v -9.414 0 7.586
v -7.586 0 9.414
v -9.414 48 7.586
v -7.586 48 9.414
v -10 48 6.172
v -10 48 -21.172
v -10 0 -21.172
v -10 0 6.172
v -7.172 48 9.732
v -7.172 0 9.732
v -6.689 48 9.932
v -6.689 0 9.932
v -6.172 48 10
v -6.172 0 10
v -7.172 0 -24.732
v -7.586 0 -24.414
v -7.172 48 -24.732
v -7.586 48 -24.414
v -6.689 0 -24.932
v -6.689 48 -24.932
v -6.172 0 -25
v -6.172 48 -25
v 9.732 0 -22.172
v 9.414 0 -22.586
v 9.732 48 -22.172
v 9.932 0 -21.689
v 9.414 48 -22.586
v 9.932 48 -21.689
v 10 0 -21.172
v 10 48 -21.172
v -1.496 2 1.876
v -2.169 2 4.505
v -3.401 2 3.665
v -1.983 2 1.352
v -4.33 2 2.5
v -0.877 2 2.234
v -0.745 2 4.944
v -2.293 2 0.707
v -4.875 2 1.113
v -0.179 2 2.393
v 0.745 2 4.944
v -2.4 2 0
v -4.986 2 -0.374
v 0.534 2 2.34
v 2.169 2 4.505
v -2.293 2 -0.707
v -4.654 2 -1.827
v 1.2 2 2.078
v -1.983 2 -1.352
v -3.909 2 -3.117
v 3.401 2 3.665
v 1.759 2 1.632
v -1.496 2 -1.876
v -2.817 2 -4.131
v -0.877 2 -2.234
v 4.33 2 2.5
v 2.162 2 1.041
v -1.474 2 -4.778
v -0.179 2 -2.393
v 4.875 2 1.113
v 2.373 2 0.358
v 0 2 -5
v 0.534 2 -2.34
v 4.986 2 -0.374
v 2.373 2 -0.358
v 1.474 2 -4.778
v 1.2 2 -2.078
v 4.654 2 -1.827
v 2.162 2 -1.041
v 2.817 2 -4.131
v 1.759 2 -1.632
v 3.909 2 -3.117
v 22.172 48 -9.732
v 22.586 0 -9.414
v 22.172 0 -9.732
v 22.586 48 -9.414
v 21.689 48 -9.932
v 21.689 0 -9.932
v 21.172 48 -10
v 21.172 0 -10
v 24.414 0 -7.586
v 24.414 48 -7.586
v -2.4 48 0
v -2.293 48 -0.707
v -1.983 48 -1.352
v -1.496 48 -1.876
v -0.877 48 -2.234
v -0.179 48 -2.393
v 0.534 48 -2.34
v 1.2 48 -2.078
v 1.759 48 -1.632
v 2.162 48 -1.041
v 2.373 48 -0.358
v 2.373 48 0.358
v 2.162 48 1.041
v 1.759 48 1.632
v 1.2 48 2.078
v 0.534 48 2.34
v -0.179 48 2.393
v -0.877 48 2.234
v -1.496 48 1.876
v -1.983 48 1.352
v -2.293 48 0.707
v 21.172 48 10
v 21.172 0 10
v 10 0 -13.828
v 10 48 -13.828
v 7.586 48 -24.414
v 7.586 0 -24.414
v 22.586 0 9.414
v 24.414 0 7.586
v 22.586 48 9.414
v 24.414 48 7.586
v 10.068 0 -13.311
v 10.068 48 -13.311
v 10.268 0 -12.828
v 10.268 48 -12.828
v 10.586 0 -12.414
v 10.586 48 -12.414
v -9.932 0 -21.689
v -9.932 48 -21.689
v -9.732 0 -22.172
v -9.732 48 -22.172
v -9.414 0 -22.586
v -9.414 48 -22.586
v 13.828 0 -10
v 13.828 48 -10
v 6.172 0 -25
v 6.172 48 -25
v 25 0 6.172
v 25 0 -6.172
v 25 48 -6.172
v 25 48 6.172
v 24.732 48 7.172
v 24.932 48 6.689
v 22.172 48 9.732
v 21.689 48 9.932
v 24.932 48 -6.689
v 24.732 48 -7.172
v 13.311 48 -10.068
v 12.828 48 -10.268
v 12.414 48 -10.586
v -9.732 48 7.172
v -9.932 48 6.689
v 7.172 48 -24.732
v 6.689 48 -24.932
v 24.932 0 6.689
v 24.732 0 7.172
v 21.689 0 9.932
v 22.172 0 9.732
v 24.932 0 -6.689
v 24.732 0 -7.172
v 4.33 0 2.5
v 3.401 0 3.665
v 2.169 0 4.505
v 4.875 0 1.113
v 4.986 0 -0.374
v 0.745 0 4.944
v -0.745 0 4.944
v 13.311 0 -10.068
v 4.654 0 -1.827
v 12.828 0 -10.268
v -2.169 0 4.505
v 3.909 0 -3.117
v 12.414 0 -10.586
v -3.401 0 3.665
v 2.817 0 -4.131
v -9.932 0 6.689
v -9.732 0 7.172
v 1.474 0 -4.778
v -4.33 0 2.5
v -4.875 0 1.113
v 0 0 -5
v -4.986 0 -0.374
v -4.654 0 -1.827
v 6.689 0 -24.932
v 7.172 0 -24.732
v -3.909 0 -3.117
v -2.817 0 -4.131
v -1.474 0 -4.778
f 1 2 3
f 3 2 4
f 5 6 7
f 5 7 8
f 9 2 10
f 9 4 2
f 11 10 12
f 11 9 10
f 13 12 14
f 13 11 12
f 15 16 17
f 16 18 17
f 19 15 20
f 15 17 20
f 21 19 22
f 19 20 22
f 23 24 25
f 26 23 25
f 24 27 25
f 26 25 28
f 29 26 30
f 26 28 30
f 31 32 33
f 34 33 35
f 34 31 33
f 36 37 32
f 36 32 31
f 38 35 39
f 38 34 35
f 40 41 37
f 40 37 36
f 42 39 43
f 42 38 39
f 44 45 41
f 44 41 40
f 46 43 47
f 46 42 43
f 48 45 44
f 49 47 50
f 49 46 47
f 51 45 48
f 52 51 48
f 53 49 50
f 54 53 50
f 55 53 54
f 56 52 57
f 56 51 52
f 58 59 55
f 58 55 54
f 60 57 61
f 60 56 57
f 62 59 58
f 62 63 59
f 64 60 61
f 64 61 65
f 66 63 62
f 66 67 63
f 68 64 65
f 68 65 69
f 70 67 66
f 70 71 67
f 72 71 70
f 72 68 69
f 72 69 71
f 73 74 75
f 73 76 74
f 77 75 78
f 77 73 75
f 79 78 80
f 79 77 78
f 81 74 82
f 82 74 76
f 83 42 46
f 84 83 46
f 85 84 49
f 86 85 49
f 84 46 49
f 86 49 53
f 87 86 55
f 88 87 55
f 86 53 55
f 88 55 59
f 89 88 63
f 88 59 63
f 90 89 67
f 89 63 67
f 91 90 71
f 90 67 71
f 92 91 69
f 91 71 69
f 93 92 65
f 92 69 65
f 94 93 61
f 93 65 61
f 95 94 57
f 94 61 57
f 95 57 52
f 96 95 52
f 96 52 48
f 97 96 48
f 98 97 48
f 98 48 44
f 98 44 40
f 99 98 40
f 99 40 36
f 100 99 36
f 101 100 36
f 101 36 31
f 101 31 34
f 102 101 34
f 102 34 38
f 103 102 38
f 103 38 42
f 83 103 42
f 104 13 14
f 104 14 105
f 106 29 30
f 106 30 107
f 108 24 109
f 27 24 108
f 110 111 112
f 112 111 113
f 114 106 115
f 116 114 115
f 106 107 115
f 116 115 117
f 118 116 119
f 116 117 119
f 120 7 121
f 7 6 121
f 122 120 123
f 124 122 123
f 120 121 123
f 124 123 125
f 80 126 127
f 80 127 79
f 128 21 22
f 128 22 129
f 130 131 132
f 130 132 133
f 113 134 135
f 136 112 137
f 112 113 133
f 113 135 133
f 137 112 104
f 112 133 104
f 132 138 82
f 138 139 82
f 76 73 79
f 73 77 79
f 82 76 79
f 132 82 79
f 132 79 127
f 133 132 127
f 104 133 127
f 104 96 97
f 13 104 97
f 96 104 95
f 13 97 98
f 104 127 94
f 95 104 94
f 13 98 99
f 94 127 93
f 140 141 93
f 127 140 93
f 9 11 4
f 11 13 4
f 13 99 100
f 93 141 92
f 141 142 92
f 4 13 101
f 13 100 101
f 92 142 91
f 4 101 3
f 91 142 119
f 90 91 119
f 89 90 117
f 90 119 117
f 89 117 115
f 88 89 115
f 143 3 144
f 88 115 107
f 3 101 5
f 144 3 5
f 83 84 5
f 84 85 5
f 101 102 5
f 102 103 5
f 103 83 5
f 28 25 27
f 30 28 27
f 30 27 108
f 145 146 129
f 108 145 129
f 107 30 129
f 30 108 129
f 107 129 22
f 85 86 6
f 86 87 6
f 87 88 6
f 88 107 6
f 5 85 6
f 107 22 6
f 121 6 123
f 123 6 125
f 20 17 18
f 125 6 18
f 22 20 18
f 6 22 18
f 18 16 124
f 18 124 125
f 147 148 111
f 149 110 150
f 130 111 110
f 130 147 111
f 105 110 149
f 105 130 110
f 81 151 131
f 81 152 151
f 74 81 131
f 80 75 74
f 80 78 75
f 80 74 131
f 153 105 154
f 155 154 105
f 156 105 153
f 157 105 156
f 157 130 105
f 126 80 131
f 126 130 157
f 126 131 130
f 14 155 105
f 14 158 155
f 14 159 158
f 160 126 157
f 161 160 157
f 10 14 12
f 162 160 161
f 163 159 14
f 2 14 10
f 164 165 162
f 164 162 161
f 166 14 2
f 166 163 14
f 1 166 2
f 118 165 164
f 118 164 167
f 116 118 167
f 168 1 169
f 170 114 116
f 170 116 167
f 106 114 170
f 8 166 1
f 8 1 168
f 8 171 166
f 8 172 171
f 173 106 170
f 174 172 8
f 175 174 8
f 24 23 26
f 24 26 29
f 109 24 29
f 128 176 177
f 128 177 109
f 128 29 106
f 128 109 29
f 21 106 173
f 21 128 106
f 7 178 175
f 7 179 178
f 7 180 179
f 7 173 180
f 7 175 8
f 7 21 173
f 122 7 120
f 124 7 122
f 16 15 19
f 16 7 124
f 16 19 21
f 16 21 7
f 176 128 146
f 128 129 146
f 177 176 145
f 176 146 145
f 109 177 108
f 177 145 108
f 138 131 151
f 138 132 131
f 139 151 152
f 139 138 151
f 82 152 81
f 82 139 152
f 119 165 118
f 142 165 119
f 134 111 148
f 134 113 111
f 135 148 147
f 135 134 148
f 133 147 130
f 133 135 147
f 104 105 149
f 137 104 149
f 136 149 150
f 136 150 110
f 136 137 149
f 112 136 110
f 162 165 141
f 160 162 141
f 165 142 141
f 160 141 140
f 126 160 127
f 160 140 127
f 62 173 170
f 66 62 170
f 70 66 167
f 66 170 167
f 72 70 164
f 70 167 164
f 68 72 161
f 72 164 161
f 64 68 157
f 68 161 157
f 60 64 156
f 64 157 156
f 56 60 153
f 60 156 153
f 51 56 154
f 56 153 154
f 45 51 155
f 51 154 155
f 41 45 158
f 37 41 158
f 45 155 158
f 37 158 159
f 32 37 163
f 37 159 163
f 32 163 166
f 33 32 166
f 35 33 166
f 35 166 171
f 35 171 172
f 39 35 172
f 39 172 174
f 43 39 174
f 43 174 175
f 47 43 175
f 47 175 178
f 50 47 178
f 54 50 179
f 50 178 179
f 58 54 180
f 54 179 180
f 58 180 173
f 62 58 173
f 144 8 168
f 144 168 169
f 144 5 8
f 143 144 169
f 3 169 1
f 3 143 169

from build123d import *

# Parameters (mm, degrees)
BOSS_EXTRUDE1_DEPTH  = 48
M4_CLEARANCE_HOLE1_D = 4.8
SKETCH4_R            = 5
CUT_EXTRUDE1_DEPTH   = 2
CHAMFER1_SIZE        = 3
FILLET1_R            = 2


with BuildPart() as part:
    # Sketch1 → Boss-Extrude1 (new body)
    with BuildSketch(Plane(origin=(0, 0, 0), x_dir=(1, 0, 0), z_dir=(0, 1, 0))):
        Polygon((-10, 10), (-10, 25), (10, 25), (10, 10), (25, 10), (25, -10), (10, -10), (-10, -10), align=None)
    extrude(amount=BOSS_EXTRUDE1_DEPTH)

    # M4 Clearance Hole1 (through all)
    with Locations(Plane(origin=(0, 48, 0), x_dir=(1, 0, 0), z_dir=(0, 1, 0))):
        with Locations((0, 0)):
            Hole(M4_CLEARANCE_HOLE1_D / 2)

    # Sketch4 → Cut-Extrude1 (cut)
    with BuildSketch(Plane.XZ):
        with Locations(Location((0, 0, 0), (0, 0, 270))):
            Circle(SKETCH4_R)
    extrude(amount=-CUT_EXTRUDE1_DEPTH, mode=Mode.SUBTRACT)

    # Chamfer1
    chamfer1_edges = [part.edges().sort_by_distance(p)[0] for p in [
        (-10, 24, -25),
        (10, 24, -25),
        (10, 24, -10),
        (25, 24, -10),
        (25, 24, 10),
        (-10, 24, 10),
    ]]
    chamfer(chamfer1_edges, length=CHAMFER1_SIZE)

    # Fillet1
    fillet1_edges = [part.edges().sort_by_distance(p)[0] for p in [
        (10, 24, -22),
        (10, 24, -13),
        (22, 24, -10),
        (13, 24, -10),
        (-10, 24, 7),
        (-10, 24, -22),
        (7, 24, -25),
        (-7, 24, -25),
        (25, 24, 7),
        (25, 24, -7),
        (-7, 24, 10),
        (22, 24, 10),
    ]]
    fillet(fillet1_edges, radius=FILLET1_R)


solid = part.part
